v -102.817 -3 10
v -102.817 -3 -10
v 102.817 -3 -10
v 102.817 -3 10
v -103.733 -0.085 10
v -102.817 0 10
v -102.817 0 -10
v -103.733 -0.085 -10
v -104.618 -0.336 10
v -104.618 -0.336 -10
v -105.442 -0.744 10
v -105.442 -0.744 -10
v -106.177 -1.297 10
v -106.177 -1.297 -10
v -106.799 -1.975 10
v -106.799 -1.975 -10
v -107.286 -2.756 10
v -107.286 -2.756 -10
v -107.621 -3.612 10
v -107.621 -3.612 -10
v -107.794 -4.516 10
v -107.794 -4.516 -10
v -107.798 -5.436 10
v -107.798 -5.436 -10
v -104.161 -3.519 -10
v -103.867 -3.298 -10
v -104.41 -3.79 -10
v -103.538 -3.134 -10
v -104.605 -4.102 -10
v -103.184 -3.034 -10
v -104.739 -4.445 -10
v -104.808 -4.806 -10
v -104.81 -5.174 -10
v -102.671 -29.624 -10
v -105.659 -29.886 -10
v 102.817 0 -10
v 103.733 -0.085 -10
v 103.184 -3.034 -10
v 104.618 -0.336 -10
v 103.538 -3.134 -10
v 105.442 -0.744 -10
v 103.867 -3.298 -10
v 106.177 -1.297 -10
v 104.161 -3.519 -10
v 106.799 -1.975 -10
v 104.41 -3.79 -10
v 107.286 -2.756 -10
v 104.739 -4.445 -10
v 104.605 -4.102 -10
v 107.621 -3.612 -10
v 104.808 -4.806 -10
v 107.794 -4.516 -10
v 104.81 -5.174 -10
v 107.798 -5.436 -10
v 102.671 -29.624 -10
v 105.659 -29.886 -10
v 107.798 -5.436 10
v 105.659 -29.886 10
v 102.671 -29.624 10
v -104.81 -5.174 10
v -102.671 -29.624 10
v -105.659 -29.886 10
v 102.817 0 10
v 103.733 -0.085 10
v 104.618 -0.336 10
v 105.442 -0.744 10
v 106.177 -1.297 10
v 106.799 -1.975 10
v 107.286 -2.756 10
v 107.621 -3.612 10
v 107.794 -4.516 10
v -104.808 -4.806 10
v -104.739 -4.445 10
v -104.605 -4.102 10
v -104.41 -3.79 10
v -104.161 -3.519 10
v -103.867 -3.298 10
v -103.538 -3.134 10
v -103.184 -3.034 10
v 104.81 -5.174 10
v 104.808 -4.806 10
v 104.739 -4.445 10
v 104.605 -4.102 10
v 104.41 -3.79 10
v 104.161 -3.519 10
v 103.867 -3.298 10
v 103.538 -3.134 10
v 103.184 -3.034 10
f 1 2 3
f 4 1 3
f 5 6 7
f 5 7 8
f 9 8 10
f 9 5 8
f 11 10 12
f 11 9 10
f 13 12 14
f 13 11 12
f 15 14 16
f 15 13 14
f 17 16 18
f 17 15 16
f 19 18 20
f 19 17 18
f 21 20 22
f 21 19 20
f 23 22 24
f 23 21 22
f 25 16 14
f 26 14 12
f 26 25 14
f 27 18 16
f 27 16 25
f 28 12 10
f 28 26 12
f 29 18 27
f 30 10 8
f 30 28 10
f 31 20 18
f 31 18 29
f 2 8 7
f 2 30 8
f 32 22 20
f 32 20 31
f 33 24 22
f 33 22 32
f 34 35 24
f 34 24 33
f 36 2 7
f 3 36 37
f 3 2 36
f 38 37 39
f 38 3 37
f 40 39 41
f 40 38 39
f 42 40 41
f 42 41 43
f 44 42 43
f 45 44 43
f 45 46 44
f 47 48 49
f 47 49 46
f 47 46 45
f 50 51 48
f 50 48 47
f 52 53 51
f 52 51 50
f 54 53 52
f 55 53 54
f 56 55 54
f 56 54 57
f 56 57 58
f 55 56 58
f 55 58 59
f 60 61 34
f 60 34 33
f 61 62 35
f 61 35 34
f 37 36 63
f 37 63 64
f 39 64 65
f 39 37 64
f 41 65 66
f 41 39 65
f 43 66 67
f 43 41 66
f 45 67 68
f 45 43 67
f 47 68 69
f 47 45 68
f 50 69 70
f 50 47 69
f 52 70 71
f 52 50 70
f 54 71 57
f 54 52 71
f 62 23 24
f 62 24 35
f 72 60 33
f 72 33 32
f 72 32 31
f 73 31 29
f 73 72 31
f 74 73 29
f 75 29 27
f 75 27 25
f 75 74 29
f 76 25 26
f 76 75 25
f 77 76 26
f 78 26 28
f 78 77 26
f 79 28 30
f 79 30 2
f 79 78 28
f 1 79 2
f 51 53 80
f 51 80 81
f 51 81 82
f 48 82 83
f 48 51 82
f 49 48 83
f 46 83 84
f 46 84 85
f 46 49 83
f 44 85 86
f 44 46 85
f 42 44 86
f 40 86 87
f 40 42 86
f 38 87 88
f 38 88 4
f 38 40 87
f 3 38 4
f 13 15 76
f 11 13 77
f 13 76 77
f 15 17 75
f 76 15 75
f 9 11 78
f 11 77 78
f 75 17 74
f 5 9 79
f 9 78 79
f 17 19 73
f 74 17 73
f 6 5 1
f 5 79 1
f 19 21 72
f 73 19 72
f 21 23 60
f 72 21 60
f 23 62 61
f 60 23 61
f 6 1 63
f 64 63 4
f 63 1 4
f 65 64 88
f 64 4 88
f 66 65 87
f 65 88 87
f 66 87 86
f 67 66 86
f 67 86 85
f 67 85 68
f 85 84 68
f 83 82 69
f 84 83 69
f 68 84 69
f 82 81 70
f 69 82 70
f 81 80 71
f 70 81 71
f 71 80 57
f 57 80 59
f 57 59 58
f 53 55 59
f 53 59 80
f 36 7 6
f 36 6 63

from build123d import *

# Parameters (mm, degrees)
SKETCH1_W                      = 210
SKETCH1_H                      = 20
BASE_FLANGE1_DEPTH             = 3
EDGE_FLANGE1_STRIP_CUT_DEPTH   = 20
EDGE_FLANGE1_STRIP_CUT_2_DEPTH = 20
EDGE_FLANGE1_DEPTH             = 20
EDGE_FLANGE1_BEND_DEPTH        = 20


# Sheet-metal steps are written as plain solids
with BuildPart() as part:
    # Sketch1 → Base-Flange1 (new body)
    with BuildSketch(Plane(origin=(0, 0, 0), x_dir=(1, 0, 0), z_dir=(0, 1, 0))):
        Rectangle(SKETCH1_W, SKETCH1_H)
    extrude(amount=-BASE_FLANGE1_DEPTH)

    # Edge-Flange1 strip (across the edge) → Edge-Flange1 strip cut (cut)
    with BuildSketch(Plane(origin=(-105, -3, 10), x_dir=(0.9961946980917459, 0.08715574274765482, 0), z_dir=(0, 0, -1))):
        Polygon((-14.95871317, -4.320177336), (2.435778714, -2.798356488), (2.174311485, 0.190227606), (-15.220180398, -1.331593242), align=None)
    extrude(amount=EDGE_FLANGE1_STRIP_CUT_DEPTH, mode=Mode.SUBTRACT)

    # Edge-Flange1 strip 2 (across the edge) → Edge-Flange1 strip cut 2 (cut)
    with BuildSketch(Plane(origin=(105, -3, -10), x_dir=(-0.9961946980917459, 0.08715574274765482, 0), z_dir=(0, 0, 1))):
        Polygon((-14.95871317, -4.320177336), (2.435778714, -2.798356488), (2.174311485, 0.190227606), (-15.220180398, -1.331593242), align=None)
    extrude(amount=EDGE_FLANGE1_STRIP_CUT_2_DEPTH, mode=Mode.SUBTRACT)

    # Edge-Flange1 section (across the edge) → Edge-Flange1 (add)
    with BuildSketch(Plane(origin=(-105, -3, 10), x_dir=(0.9961946980917459, 0.08715574274765482, 0), z_dir=(0, 0, -1))):
        with BuildLine():
            Line((-3, 2.182617002), (-3, 26.726074497))
            Line((-3, 26.726074497), (0, 26.726074497))
            Line((0, 26.726074497), (0, 2.182617002))
            ThreePointArc((0, 2.182617002), (0.648819585, 0.708062329), (2.174311485, 0.190227606))
            Line((2.174311485, 0.190227606), (2.435778714, -2.798356488))
            ThreePointArc((2.435778714, -2.798356488), (-1.377951038, -1.503769682), (-3, 2.182617002))
        make_face()
    extrude(amount=EDGE_FLANGE1_DEPTH)

    # Edge-Flange1 section 2 (across the edge) → Edge-Flange1 bend (add)
    with BuildSketch(Plane(origin=(105, -3, -10), x_dir=(-0.9961946980917459, 0.08715574274765482, 0), z_dir=(0, 0, 1))):
        with BuildLine():
            Line((-3, 2.182617002), (-3, 26.726074497))
            Line((-3, 26.726074497), (0, 26.726074497))
            Line((0, 26.726074497), (0, 2.182617002))
            ThreePointArc((0, 2.182617002), (0.648819585, 0.708062329), (2.174311485, 0.190227606))
            Line((2.174311485, 0.190227606), (2.435778714, -2.798356488))
            ThreePointArc((2.435778714, -2.798356488), (-1.377951038, -1.503769682), (-3, 2.182617002))
        make_face()
    extrude(amount=EDGE_FLANGE1_BEND_DEPTH)


solid = part.part
